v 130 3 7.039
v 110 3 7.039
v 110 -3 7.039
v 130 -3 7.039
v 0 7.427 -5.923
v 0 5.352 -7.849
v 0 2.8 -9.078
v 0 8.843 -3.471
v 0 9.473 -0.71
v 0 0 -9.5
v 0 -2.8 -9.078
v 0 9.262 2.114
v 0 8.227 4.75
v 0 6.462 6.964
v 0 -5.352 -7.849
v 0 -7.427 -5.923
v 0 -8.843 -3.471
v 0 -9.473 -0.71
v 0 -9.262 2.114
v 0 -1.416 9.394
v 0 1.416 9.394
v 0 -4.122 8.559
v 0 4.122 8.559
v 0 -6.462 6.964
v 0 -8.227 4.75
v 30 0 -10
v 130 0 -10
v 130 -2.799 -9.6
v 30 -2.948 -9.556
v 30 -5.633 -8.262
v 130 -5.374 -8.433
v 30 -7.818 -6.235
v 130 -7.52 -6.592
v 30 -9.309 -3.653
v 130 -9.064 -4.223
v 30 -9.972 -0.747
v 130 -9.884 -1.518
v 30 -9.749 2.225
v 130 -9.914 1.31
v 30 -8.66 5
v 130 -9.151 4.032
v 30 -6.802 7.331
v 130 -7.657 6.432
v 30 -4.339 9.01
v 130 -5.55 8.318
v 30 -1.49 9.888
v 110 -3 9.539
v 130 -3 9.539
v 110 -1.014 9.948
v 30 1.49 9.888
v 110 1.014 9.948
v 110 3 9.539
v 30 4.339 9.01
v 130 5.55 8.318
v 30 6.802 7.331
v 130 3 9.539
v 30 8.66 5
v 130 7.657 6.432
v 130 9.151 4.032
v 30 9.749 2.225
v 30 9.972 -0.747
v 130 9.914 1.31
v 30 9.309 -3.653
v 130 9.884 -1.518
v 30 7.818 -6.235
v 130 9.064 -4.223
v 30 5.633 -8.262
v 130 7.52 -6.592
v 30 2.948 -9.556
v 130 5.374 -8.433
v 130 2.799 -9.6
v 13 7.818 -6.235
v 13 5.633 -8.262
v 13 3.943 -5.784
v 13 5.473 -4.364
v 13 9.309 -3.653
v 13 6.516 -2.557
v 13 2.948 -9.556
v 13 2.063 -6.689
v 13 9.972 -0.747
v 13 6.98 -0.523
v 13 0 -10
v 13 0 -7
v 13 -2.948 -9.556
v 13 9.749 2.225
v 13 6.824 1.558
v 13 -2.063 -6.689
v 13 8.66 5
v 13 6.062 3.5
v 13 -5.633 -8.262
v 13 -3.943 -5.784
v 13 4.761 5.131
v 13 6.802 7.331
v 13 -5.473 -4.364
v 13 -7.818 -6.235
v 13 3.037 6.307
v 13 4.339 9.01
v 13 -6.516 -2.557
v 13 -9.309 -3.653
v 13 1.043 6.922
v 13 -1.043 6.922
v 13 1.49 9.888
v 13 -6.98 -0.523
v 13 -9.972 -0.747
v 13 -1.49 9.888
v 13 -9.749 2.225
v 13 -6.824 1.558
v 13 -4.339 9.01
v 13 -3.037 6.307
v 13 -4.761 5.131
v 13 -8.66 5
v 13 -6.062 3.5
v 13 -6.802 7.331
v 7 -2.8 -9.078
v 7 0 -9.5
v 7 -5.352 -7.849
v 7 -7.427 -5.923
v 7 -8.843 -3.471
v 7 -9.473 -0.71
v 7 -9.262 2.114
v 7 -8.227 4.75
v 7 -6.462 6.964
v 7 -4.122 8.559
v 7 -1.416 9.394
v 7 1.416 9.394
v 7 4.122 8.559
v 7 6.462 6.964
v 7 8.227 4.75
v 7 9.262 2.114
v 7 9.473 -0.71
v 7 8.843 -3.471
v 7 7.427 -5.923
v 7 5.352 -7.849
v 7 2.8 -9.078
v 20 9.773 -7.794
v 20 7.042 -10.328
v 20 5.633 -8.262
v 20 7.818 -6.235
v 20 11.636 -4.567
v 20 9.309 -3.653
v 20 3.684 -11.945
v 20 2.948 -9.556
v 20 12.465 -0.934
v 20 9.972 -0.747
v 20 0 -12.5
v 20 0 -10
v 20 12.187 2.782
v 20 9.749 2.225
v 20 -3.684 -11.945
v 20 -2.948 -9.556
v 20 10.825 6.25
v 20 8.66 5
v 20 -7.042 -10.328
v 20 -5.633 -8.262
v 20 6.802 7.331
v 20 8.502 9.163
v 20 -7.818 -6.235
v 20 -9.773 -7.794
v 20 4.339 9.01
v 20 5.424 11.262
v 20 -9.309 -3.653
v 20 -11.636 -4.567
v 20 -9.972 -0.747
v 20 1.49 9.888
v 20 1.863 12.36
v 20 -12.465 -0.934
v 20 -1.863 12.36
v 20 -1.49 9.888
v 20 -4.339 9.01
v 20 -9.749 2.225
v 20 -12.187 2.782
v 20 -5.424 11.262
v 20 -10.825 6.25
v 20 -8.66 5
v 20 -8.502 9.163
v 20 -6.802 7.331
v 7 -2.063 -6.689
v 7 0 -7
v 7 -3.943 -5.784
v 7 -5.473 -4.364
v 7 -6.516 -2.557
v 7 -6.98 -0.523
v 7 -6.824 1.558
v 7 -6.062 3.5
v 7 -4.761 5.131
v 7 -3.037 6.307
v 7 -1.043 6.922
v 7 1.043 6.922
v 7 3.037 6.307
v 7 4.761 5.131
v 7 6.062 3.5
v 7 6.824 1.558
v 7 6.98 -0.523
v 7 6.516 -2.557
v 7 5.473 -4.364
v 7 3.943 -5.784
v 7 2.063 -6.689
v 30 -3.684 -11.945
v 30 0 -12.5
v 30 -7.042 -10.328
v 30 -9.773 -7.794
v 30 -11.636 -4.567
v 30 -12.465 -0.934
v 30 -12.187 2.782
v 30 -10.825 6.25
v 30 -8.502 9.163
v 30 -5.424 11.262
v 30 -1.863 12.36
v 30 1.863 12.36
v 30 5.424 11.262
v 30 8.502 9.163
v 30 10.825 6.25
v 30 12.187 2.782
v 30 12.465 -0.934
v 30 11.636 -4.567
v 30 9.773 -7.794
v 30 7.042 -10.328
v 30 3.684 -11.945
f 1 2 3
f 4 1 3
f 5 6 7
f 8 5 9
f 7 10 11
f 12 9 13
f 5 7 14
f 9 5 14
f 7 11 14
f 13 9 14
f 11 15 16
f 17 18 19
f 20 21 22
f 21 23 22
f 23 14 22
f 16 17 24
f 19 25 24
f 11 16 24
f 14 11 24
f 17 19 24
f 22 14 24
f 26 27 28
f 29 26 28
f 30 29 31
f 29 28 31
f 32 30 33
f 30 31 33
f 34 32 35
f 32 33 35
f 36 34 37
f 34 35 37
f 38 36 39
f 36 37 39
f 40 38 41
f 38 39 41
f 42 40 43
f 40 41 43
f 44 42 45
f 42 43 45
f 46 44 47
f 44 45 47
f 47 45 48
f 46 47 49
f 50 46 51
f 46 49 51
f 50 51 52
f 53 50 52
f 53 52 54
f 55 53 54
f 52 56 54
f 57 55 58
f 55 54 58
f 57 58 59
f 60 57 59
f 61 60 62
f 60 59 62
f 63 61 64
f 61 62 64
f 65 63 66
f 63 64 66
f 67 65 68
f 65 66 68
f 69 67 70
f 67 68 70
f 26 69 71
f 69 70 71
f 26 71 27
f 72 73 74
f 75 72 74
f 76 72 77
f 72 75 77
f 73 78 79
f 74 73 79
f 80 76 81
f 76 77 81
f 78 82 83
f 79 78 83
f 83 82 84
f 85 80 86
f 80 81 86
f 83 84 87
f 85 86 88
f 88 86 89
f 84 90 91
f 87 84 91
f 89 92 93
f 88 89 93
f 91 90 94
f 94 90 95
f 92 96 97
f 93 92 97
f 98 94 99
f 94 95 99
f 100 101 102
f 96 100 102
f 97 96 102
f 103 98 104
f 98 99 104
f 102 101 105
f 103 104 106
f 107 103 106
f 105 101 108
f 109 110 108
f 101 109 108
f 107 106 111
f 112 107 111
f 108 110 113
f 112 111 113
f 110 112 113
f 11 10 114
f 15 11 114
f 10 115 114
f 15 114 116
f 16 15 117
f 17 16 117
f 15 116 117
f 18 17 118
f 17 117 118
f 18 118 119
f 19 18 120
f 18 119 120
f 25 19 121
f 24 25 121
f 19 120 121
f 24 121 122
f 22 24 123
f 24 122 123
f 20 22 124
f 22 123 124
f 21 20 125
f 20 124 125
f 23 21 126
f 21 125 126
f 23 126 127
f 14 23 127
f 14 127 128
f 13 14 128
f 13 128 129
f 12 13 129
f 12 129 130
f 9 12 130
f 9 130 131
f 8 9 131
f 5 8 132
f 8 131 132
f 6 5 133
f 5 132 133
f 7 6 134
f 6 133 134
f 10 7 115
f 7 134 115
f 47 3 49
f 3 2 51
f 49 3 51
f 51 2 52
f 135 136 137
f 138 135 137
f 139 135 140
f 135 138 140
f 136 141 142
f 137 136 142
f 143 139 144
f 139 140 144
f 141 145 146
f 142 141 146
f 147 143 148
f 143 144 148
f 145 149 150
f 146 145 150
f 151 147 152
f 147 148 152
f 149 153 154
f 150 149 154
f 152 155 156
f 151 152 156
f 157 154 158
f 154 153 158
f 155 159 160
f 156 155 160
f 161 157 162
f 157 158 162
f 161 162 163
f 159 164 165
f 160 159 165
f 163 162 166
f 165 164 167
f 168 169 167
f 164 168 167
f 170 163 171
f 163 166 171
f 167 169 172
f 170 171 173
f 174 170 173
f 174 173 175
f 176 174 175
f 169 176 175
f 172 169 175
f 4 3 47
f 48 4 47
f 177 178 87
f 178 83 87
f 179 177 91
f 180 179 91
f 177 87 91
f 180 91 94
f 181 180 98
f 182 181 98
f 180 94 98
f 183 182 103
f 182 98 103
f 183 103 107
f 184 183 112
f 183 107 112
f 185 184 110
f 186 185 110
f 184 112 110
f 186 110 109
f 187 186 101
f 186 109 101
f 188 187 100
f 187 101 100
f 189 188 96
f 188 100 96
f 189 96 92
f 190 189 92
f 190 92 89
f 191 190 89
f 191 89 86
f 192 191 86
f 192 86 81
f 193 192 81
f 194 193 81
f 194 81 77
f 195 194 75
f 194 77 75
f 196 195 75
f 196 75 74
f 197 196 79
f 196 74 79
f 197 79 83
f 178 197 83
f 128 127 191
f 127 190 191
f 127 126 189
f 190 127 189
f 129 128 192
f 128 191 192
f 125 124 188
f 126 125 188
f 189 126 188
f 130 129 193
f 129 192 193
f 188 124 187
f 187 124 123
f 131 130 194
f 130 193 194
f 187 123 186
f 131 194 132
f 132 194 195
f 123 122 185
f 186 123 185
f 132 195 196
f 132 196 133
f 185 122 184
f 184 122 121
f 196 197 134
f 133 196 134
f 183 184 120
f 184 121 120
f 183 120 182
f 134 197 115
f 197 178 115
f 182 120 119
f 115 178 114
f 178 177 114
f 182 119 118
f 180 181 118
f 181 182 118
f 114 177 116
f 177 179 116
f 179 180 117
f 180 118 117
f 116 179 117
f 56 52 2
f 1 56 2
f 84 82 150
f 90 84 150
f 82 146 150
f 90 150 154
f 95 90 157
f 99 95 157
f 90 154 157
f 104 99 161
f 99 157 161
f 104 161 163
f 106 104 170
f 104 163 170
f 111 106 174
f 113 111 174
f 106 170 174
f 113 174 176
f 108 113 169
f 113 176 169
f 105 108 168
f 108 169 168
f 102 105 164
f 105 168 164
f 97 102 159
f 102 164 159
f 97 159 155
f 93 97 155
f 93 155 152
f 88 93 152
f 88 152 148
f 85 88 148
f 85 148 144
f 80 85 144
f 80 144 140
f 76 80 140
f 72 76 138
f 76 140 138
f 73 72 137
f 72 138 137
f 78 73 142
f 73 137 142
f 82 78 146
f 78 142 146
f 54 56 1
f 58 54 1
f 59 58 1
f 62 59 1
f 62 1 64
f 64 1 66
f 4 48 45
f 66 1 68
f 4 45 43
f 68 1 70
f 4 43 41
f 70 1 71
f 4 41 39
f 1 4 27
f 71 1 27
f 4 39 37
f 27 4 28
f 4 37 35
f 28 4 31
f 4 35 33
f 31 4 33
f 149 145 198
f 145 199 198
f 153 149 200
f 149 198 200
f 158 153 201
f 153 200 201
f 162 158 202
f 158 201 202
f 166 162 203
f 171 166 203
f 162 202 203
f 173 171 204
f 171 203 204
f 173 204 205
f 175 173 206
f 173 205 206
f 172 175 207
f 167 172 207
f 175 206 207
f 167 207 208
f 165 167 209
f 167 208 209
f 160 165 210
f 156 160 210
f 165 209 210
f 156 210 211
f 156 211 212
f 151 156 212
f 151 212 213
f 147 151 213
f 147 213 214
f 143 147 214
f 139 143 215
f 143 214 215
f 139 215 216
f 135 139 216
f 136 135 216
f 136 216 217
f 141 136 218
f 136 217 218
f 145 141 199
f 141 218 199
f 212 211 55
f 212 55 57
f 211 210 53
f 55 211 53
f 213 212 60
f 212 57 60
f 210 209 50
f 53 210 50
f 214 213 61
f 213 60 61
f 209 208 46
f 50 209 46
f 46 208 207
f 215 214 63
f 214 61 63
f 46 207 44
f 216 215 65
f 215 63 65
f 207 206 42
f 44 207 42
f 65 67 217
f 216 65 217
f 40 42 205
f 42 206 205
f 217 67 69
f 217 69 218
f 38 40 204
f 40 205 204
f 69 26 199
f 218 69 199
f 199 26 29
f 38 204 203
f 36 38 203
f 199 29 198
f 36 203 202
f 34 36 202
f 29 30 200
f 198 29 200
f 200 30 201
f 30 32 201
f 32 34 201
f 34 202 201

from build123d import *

# Parameters (mm, degrees)
CUT_EXTRUDE1_DEPTH = 20


with BuildPart() as part:
    # Sketch1 → Revolve1 (revolve)
    with BuildSketch(Plane.XY, mode=Mode.PRIVATE) as revolve1_sk:
        Polygon((0, 0), (0, 9.5), (7, 9.5), (7, 7), (13, 7), (13, 10), (20, 10), (20, 12.5), (30, 12.5), (30, 10), (130, 10), (130, 0), align=None)
    revolve(revolve1_sk.sketch.rotate(Axis((130, 0, 0), (-1, 0, 0)), 90), axis=Axis((130, 0, 0), (-1, 0, 0)))

    # Sketch2 → Cut-Extrude1 (cut)
    with BuildSketch(Plane(origin=(130, 0, 0), x_dir=(0, 0, -1), z_dir=(1, 0, 0))):
        with BuildLine():
            Line((-9.539392014, 3), (-7.039392014, 3))
            Line((-7.039392014, 3), (-7.039392014, -3))
            Line((-7.039392014, -3), (-9.539392014, -3))
            ThreePointArc((-9.539392014, -3), (-10, 0), (-9.539392014, 3))
        make_face()
    extrude(amount=-CUT_EXTRUDE1_DEPTH, mode=Mode.SUBTRACT)


solid = part.part
